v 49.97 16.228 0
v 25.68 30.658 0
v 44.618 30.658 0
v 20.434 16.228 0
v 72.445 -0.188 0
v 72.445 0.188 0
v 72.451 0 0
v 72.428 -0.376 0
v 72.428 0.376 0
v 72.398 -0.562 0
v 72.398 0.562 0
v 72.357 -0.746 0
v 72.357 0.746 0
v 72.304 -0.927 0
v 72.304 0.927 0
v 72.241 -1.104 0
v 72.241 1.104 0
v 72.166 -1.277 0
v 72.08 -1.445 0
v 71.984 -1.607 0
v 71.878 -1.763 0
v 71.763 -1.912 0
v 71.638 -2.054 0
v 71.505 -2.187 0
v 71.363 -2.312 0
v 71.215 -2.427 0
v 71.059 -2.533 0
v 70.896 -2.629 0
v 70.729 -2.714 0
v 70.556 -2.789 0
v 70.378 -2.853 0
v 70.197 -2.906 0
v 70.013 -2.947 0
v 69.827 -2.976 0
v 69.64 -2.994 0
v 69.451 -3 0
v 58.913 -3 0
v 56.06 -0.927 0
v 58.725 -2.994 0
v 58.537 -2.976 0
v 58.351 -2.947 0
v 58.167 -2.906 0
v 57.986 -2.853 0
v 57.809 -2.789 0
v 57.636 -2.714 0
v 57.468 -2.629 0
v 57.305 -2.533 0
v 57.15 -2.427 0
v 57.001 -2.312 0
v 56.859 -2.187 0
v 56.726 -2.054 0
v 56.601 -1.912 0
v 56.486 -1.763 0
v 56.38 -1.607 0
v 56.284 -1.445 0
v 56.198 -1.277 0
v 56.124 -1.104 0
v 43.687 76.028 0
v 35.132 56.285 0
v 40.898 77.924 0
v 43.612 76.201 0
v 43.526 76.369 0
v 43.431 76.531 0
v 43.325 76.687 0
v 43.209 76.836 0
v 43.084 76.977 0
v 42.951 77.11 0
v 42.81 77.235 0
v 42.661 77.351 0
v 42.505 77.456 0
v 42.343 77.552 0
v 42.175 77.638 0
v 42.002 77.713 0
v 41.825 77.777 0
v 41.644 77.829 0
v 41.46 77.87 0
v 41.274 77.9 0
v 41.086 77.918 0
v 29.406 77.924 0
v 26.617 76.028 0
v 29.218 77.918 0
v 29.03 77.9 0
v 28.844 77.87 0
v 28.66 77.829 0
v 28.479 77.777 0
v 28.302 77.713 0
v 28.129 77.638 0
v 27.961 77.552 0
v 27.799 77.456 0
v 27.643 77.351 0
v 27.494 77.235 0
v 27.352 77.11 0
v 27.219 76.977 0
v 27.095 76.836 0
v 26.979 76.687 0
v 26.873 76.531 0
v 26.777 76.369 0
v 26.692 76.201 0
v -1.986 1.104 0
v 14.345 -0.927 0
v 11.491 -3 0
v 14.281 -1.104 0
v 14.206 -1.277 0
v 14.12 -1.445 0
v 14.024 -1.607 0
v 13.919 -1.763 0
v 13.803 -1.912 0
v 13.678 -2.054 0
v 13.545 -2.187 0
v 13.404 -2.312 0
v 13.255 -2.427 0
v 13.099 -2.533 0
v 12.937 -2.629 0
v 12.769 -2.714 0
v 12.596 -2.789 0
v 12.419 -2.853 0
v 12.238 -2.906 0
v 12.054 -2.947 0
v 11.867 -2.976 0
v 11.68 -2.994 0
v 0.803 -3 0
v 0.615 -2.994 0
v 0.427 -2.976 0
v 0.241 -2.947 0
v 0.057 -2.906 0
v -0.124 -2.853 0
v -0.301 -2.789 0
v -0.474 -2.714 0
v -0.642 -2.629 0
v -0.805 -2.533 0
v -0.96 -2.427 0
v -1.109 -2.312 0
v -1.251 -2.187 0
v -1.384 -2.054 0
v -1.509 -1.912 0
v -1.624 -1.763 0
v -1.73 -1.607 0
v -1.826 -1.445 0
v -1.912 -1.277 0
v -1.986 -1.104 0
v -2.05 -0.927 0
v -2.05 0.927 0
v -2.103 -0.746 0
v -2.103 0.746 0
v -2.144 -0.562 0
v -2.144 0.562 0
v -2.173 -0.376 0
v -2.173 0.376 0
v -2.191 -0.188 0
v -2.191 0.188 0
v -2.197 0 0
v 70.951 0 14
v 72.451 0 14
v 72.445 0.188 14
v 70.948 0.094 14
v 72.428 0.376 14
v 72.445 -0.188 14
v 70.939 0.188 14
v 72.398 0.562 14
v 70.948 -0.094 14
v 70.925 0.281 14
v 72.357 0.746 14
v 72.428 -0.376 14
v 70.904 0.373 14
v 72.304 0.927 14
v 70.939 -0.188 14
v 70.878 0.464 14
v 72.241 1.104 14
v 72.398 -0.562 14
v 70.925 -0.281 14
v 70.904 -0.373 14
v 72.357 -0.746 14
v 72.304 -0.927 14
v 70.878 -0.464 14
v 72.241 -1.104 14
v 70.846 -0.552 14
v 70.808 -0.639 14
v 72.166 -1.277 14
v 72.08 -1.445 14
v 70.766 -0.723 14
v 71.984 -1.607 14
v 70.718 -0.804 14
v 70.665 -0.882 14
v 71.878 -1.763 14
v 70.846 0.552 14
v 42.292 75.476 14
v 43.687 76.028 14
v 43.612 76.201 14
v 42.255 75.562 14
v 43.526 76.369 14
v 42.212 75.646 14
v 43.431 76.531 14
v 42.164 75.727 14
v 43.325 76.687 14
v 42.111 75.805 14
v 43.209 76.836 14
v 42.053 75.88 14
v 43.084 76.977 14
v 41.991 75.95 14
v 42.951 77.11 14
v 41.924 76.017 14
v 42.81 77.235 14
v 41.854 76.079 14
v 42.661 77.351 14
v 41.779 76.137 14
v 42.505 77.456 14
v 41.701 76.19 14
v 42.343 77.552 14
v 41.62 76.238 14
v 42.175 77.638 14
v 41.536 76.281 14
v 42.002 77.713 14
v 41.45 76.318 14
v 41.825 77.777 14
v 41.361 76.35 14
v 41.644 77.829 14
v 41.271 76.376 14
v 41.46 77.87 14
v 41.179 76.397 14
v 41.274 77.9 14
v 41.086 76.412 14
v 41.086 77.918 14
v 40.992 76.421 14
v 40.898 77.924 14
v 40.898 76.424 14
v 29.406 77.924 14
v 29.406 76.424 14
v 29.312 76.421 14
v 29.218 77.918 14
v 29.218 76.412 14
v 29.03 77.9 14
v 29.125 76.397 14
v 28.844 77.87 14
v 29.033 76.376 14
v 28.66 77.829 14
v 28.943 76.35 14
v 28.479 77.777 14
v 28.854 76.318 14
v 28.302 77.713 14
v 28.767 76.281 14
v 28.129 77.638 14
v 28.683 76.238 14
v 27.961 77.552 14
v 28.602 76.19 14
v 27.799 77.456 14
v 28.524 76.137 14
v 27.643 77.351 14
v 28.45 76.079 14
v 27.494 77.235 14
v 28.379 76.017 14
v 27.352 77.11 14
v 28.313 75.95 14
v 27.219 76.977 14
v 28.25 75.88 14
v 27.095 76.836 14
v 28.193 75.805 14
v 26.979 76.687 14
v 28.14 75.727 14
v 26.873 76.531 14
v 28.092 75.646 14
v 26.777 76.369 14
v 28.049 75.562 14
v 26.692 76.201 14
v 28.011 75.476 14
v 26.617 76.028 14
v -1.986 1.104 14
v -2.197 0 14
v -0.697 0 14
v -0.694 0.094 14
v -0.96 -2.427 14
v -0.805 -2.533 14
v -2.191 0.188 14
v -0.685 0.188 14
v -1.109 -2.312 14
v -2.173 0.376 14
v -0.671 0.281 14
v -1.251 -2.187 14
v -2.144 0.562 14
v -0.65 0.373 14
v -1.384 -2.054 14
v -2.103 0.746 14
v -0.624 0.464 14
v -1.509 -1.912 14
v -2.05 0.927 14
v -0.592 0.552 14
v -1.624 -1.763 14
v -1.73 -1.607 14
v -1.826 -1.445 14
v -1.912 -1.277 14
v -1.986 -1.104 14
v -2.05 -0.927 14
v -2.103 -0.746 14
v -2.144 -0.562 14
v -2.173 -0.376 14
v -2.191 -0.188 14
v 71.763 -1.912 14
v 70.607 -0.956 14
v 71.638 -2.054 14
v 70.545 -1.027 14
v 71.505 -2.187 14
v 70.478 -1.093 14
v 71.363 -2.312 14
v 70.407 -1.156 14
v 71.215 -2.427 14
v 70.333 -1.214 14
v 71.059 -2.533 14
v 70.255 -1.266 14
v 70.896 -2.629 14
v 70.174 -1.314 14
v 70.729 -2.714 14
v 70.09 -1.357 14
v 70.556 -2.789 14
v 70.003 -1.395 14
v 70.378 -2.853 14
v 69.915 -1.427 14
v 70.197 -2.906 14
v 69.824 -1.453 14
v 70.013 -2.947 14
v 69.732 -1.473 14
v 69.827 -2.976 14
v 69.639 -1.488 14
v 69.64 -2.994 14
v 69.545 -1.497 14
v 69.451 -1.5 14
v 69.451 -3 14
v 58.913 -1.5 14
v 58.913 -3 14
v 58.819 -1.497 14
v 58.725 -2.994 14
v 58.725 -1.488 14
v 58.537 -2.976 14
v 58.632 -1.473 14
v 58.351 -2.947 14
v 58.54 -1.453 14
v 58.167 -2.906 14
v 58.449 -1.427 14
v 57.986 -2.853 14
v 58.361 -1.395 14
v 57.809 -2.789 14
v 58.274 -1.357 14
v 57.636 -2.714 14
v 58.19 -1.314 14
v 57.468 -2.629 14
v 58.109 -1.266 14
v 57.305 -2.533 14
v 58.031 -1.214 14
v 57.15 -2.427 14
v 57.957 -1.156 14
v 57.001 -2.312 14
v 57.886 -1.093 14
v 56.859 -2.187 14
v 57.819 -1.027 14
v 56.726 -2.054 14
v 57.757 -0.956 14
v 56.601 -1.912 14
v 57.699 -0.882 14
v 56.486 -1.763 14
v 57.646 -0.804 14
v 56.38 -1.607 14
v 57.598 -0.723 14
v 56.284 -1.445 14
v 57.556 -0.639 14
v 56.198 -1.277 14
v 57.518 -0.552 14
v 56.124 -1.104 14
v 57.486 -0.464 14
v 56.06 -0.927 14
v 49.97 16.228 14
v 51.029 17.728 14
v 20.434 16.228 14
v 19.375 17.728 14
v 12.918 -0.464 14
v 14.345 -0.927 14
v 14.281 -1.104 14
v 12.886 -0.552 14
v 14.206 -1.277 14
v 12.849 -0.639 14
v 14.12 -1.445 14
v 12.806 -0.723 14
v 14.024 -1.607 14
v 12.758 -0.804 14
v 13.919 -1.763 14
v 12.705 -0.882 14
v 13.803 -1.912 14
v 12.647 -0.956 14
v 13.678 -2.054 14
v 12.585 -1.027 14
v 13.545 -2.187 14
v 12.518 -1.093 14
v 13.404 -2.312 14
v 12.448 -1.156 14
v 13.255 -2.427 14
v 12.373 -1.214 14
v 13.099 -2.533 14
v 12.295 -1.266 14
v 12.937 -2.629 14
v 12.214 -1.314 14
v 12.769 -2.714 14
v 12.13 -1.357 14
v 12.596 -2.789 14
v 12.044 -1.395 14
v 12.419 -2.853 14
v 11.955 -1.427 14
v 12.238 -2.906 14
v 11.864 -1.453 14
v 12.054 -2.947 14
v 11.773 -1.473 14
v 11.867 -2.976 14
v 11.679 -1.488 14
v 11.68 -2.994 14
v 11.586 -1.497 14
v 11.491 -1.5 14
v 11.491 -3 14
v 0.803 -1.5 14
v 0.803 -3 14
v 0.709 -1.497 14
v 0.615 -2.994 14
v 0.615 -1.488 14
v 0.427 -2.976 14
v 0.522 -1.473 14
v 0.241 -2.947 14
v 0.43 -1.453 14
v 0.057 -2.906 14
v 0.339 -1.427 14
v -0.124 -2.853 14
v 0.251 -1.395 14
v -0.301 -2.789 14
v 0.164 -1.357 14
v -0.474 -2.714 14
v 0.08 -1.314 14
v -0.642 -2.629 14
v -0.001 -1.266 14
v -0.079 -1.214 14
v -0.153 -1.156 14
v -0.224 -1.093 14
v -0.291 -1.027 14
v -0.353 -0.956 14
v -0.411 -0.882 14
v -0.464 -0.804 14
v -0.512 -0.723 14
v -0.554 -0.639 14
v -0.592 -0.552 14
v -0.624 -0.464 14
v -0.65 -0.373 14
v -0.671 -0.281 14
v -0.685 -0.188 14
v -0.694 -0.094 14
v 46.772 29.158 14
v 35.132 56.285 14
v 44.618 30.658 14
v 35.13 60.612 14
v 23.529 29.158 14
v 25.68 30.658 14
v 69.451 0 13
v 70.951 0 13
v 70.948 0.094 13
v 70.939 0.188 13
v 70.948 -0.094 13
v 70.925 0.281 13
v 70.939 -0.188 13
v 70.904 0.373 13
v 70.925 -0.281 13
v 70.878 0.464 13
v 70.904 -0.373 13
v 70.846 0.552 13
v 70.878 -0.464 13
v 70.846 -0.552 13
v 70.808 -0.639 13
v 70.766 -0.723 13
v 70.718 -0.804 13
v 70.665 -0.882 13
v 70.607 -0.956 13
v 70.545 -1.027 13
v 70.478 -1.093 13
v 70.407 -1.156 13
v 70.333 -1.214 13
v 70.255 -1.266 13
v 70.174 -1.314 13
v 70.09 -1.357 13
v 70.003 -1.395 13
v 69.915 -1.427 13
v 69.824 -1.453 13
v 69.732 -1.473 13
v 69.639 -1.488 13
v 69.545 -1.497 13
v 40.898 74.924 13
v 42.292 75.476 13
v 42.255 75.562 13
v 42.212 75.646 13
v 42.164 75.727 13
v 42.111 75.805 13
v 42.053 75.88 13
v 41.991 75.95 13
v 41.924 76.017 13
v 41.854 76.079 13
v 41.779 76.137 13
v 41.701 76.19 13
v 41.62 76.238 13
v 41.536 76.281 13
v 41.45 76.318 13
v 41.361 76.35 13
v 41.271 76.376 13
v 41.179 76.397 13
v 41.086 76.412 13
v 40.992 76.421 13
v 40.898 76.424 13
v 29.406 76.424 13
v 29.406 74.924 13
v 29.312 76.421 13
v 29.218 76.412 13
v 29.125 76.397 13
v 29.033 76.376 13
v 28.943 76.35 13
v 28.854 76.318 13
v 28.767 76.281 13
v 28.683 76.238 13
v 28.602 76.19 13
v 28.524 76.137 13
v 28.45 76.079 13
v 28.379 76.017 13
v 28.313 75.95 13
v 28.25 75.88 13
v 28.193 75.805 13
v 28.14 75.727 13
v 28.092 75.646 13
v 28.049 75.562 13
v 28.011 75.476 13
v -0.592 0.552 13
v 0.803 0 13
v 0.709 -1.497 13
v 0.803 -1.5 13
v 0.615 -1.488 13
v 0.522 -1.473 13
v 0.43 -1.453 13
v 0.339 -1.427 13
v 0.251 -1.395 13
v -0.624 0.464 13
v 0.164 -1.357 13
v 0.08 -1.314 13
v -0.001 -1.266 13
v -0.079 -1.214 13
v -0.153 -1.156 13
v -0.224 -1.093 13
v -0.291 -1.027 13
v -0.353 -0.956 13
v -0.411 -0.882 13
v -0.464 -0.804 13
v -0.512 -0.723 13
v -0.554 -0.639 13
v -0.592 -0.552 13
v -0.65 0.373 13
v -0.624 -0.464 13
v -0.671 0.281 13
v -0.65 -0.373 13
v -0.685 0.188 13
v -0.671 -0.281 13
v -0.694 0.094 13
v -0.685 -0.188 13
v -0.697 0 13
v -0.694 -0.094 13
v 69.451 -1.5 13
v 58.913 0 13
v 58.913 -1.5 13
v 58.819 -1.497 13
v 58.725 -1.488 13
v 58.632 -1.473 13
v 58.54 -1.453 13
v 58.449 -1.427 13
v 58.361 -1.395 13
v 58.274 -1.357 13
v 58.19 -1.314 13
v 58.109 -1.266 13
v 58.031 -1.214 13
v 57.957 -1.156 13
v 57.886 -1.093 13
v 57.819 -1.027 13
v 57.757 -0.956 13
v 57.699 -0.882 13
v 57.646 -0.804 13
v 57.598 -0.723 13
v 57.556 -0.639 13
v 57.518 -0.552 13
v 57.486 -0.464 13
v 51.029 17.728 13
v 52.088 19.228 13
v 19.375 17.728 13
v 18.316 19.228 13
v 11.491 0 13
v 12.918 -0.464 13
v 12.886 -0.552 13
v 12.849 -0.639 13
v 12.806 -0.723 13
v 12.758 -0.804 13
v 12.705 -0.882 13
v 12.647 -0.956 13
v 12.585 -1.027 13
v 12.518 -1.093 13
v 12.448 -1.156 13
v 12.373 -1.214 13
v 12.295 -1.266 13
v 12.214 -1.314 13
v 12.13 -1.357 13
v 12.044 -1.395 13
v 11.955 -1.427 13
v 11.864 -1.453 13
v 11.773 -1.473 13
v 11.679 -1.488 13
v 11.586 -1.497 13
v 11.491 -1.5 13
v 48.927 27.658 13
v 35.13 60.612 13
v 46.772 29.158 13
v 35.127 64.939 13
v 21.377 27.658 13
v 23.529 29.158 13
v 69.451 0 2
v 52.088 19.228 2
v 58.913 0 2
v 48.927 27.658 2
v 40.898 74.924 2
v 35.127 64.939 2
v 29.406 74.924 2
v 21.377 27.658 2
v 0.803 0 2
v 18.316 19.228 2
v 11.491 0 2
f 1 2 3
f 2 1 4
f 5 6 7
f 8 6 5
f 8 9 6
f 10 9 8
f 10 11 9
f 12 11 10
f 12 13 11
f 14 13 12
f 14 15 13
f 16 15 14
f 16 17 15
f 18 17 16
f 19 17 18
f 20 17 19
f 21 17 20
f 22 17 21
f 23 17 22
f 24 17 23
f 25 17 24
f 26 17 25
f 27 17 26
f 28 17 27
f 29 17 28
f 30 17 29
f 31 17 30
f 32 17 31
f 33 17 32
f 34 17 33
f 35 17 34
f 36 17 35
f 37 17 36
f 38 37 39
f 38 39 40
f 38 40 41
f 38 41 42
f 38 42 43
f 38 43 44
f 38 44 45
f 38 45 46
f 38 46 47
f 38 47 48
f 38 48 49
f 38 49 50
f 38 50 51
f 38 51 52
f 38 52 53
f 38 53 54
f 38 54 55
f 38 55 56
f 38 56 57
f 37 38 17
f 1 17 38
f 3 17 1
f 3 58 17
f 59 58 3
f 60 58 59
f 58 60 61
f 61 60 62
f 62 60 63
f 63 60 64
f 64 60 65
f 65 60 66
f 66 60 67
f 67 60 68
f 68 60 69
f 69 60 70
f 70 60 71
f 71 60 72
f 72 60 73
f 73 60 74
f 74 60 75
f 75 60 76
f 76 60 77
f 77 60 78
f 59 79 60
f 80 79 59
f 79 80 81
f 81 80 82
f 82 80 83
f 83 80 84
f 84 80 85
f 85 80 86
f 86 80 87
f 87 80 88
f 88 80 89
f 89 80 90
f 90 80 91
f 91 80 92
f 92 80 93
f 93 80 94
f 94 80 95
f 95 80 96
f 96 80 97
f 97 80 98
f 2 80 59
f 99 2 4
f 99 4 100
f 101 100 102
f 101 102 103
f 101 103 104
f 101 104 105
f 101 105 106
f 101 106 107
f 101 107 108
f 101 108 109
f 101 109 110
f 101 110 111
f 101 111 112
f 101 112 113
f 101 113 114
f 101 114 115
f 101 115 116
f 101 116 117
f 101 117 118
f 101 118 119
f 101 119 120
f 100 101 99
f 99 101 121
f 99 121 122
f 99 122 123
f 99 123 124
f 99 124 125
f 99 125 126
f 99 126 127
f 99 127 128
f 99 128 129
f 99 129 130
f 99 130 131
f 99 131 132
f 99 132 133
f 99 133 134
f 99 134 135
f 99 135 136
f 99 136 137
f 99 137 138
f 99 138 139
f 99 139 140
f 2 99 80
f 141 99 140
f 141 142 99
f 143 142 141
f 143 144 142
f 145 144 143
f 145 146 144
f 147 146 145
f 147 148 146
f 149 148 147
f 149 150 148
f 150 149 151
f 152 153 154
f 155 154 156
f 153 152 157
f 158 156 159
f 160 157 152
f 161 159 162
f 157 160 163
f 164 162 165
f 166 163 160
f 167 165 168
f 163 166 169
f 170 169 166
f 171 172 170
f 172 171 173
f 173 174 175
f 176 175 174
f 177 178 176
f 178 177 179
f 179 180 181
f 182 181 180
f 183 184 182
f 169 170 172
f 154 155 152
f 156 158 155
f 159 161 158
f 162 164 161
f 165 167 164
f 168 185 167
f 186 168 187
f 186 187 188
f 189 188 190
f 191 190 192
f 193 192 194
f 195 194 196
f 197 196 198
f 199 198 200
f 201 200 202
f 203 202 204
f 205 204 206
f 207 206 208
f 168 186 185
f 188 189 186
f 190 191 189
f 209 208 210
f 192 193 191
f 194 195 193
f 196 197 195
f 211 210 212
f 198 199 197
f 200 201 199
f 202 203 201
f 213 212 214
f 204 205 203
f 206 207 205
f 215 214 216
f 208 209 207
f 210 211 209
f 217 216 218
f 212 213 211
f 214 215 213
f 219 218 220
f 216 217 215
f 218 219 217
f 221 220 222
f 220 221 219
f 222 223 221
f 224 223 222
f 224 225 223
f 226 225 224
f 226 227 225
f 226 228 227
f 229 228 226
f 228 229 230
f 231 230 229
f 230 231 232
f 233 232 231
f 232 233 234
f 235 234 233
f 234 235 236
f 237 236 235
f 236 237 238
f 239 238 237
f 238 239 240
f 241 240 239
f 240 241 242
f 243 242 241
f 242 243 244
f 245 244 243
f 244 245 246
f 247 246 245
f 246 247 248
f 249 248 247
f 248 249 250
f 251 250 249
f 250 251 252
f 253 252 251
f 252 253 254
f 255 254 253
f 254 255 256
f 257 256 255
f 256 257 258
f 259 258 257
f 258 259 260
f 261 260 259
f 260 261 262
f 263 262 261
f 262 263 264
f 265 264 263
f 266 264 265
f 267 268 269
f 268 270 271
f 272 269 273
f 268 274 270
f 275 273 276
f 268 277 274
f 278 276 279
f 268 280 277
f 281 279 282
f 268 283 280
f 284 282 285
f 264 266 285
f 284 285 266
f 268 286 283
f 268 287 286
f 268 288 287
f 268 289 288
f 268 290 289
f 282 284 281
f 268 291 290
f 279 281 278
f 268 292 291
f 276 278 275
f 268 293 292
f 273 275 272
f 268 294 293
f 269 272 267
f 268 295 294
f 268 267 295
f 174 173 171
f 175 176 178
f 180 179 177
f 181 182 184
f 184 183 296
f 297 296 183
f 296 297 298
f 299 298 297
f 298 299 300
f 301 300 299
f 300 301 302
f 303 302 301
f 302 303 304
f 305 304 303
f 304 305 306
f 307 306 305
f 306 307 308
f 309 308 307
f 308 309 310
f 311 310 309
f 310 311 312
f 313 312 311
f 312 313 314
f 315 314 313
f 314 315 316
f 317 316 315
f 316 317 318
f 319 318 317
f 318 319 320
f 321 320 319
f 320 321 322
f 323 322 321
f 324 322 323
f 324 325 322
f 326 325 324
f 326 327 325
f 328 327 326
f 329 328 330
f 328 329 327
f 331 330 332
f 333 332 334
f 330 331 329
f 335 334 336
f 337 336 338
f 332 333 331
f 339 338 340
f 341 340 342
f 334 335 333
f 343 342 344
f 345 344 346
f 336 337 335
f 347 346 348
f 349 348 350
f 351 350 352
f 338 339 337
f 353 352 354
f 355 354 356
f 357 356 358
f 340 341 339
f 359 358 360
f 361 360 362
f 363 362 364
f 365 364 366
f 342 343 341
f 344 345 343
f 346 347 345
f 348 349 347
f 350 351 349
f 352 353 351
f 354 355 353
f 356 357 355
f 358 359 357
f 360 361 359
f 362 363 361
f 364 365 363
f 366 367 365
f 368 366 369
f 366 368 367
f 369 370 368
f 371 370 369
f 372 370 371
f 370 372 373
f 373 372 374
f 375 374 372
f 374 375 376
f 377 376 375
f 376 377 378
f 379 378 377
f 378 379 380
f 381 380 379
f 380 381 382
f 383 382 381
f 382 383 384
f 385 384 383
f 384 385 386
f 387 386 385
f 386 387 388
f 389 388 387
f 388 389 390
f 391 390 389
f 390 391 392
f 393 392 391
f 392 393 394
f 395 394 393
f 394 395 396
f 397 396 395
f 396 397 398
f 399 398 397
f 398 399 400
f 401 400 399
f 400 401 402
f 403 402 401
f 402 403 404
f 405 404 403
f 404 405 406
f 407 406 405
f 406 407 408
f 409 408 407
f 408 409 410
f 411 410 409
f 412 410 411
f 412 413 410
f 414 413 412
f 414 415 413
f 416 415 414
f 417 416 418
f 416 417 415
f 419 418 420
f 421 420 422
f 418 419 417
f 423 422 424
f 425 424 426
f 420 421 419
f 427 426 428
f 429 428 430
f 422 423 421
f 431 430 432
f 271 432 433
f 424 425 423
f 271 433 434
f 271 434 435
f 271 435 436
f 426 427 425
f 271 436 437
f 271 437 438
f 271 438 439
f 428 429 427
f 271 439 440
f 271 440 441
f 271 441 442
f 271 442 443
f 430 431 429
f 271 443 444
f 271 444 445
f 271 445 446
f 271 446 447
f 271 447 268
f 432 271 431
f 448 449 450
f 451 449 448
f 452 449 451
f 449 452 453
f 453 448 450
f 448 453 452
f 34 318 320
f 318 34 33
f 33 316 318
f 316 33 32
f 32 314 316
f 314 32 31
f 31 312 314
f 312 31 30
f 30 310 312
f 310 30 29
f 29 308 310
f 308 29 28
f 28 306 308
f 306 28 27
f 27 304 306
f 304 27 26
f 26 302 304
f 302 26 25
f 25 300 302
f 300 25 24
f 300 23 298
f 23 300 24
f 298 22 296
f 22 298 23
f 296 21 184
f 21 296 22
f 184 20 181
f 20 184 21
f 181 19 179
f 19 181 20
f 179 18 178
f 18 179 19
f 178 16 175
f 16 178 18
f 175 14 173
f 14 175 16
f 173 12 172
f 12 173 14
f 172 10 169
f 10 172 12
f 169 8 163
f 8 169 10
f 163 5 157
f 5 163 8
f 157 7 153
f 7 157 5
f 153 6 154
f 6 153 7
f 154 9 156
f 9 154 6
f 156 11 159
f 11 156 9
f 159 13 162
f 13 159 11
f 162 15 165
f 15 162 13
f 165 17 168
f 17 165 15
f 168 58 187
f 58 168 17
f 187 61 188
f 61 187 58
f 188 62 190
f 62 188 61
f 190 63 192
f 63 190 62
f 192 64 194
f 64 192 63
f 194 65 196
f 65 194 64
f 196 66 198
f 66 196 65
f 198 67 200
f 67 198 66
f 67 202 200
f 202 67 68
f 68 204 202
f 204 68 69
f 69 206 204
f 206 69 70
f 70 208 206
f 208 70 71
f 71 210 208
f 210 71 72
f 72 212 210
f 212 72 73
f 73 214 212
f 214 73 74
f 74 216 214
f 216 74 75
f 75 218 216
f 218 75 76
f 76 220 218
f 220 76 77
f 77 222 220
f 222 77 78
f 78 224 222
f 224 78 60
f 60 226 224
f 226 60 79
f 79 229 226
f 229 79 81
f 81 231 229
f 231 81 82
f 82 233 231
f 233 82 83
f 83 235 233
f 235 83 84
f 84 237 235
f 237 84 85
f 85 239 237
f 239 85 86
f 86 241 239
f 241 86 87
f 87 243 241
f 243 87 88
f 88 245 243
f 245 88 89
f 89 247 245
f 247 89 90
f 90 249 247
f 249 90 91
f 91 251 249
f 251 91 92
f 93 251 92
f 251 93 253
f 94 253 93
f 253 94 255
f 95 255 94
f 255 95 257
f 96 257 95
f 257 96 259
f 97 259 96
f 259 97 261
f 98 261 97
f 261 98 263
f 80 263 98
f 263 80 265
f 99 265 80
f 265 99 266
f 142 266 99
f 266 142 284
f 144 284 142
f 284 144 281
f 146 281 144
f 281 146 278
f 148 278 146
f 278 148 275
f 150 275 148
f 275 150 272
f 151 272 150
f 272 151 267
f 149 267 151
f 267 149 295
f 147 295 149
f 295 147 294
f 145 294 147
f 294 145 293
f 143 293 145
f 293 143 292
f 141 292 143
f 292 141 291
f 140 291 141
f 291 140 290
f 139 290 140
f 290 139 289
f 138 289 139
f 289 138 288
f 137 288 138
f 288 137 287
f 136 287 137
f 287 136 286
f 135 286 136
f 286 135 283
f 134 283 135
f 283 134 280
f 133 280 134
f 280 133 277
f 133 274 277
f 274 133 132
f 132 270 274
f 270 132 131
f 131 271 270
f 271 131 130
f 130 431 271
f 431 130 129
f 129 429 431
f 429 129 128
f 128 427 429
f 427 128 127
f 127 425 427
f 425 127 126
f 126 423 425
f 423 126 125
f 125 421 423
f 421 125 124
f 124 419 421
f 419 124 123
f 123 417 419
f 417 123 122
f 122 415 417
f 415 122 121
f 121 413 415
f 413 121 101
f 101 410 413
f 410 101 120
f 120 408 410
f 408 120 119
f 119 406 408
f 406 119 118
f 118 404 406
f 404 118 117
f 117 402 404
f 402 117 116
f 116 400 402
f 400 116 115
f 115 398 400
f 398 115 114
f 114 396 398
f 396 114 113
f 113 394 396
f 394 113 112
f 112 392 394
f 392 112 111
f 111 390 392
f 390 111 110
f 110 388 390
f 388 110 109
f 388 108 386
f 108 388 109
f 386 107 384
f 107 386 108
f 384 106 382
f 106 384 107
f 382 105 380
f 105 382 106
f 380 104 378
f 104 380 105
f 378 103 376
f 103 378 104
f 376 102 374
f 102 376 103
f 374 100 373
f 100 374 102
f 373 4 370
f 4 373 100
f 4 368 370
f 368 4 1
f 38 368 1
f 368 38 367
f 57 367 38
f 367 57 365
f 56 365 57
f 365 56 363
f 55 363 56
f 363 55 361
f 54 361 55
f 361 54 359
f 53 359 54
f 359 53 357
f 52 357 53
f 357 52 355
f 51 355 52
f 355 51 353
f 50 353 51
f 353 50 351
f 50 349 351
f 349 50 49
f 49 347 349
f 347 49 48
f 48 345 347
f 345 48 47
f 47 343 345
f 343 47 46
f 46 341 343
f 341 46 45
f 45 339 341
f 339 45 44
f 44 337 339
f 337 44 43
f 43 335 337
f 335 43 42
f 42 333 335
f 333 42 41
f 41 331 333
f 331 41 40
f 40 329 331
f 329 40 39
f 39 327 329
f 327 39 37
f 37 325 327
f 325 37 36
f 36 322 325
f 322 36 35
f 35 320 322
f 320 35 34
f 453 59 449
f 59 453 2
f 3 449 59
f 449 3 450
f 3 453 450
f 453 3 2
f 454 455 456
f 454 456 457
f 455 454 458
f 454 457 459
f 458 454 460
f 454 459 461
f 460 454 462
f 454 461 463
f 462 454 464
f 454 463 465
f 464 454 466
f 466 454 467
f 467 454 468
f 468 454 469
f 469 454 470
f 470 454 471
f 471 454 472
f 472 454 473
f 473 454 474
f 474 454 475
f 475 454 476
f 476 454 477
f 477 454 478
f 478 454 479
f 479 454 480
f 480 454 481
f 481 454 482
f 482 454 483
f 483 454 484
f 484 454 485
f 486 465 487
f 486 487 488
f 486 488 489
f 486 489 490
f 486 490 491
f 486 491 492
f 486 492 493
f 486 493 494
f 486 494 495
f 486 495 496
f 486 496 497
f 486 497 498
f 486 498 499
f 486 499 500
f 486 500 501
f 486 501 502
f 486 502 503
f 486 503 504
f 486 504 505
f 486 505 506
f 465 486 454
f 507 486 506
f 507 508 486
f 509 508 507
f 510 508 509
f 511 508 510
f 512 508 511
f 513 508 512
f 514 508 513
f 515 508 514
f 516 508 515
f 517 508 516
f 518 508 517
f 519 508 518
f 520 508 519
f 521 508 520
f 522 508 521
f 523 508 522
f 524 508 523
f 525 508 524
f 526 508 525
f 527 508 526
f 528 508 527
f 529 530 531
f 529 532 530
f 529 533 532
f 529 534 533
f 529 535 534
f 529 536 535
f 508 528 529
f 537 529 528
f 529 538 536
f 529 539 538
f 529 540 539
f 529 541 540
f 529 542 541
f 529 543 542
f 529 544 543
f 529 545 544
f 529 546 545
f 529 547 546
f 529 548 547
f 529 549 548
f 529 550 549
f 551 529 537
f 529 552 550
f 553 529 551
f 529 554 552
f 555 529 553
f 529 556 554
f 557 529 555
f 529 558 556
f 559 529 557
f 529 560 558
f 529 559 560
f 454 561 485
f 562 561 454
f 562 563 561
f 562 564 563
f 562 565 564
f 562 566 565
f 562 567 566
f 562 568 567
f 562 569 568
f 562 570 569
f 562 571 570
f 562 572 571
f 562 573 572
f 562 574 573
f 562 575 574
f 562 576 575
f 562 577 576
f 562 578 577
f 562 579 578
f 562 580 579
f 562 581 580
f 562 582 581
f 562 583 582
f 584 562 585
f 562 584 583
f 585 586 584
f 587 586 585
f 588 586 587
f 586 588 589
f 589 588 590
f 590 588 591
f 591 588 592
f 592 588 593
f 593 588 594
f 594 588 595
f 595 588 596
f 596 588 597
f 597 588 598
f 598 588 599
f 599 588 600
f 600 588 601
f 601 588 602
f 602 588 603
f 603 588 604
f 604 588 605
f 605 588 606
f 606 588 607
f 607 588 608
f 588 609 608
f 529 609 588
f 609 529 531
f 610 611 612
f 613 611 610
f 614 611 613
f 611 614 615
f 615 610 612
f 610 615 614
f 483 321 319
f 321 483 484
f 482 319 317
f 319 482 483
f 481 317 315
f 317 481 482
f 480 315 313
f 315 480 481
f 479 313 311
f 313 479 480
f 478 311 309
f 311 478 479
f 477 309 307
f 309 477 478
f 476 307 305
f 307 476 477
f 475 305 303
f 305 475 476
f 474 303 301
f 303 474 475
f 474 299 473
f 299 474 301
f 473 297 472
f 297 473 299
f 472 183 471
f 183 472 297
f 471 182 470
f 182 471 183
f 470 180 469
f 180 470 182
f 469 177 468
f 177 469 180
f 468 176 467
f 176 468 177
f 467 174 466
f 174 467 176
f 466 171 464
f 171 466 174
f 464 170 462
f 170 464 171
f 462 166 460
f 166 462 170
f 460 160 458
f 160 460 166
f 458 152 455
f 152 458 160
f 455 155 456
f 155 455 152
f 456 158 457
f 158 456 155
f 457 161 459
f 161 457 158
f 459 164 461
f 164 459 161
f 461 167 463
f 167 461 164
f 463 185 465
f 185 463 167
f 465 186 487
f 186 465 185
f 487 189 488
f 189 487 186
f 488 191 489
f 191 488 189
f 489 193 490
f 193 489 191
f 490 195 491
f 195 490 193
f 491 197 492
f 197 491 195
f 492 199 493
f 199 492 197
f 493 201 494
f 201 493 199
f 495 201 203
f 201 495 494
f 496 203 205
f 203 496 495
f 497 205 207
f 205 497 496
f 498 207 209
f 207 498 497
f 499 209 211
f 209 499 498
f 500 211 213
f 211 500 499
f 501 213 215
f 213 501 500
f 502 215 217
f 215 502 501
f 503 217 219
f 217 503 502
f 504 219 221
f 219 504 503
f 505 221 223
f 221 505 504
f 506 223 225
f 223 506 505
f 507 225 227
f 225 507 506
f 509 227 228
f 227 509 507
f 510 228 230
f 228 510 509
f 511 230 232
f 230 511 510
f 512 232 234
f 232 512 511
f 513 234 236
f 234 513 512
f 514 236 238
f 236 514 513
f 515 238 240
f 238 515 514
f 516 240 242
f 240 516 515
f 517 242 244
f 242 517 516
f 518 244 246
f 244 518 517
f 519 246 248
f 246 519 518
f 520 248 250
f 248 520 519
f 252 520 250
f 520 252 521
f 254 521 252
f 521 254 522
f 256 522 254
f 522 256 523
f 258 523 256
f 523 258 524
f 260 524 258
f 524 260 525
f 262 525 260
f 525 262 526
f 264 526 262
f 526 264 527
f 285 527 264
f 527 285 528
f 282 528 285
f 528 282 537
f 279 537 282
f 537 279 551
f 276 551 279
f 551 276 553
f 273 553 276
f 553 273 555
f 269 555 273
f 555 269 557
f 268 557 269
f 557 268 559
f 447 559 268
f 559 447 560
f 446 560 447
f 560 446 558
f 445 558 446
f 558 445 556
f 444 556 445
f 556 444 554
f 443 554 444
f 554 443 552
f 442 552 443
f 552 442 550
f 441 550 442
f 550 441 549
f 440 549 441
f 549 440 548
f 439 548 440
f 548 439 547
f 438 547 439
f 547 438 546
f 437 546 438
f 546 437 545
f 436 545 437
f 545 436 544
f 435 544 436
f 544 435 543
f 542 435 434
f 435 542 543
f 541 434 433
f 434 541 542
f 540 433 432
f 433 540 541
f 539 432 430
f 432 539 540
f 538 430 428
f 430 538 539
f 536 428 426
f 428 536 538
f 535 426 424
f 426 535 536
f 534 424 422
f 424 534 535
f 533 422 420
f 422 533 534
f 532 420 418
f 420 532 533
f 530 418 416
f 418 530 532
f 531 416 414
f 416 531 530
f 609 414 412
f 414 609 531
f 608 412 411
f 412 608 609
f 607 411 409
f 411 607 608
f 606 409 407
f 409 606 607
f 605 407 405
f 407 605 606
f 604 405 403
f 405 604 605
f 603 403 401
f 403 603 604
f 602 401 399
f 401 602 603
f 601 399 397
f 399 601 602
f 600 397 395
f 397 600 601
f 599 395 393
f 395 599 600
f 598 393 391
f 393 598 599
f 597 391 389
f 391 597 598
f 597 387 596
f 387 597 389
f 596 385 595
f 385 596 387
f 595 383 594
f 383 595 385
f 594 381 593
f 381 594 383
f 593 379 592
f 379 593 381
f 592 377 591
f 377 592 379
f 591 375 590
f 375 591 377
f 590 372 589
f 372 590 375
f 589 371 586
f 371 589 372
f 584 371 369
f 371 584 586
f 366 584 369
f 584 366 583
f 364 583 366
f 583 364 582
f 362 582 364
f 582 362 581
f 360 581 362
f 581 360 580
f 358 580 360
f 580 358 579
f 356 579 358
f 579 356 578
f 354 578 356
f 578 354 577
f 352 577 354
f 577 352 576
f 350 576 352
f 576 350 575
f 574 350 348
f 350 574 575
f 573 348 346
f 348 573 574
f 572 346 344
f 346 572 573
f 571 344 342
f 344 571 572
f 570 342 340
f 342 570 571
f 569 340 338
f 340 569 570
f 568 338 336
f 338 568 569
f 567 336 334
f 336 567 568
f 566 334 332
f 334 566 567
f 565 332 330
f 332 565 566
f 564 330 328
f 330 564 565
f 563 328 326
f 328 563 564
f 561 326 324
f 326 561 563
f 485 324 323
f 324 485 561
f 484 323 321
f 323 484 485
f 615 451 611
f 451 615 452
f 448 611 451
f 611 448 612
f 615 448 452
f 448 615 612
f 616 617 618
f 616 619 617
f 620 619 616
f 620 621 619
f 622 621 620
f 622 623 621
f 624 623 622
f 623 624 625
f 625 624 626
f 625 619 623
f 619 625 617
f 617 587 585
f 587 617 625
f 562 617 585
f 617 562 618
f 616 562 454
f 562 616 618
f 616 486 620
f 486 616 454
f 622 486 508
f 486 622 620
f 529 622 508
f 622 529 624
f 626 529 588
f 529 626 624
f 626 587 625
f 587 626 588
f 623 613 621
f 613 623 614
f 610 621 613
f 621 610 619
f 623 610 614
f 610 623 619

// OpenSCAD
//Sign body maker V3 - bigclivedotcom
letter = "A"; //Sign character to make
style = "Noto Mono"; //See "Help" and "Font List"
size = 80; //Size of character (height)
depth = 14; //Depth of sign character
$fn=100; //Curve facets - higher is smoother
walls = 3; //Side wall thickness
base=2; //Base thickness (-1 for open back)
face = 1; //Face thickness
//Don't change variables below here
sized=size-(2*walls);
difference(){
     linear_extrude(height=depth)
	  minkowski(){
	  text(letter,sized,style);
	  circle(walls);
     }
//Lip for front face (half wall thickness)
     translate([0,0,depth-face])
	  linear_extrude(height=2*face)
	  minkowski(){
	  text(letter,sized,style);
	  circle(walls/2);
     }
//hollow core of letter
     translate([0,0,base])
	  linear_extrude(height=depth+2)
	  text(letter,sized,style);
}
